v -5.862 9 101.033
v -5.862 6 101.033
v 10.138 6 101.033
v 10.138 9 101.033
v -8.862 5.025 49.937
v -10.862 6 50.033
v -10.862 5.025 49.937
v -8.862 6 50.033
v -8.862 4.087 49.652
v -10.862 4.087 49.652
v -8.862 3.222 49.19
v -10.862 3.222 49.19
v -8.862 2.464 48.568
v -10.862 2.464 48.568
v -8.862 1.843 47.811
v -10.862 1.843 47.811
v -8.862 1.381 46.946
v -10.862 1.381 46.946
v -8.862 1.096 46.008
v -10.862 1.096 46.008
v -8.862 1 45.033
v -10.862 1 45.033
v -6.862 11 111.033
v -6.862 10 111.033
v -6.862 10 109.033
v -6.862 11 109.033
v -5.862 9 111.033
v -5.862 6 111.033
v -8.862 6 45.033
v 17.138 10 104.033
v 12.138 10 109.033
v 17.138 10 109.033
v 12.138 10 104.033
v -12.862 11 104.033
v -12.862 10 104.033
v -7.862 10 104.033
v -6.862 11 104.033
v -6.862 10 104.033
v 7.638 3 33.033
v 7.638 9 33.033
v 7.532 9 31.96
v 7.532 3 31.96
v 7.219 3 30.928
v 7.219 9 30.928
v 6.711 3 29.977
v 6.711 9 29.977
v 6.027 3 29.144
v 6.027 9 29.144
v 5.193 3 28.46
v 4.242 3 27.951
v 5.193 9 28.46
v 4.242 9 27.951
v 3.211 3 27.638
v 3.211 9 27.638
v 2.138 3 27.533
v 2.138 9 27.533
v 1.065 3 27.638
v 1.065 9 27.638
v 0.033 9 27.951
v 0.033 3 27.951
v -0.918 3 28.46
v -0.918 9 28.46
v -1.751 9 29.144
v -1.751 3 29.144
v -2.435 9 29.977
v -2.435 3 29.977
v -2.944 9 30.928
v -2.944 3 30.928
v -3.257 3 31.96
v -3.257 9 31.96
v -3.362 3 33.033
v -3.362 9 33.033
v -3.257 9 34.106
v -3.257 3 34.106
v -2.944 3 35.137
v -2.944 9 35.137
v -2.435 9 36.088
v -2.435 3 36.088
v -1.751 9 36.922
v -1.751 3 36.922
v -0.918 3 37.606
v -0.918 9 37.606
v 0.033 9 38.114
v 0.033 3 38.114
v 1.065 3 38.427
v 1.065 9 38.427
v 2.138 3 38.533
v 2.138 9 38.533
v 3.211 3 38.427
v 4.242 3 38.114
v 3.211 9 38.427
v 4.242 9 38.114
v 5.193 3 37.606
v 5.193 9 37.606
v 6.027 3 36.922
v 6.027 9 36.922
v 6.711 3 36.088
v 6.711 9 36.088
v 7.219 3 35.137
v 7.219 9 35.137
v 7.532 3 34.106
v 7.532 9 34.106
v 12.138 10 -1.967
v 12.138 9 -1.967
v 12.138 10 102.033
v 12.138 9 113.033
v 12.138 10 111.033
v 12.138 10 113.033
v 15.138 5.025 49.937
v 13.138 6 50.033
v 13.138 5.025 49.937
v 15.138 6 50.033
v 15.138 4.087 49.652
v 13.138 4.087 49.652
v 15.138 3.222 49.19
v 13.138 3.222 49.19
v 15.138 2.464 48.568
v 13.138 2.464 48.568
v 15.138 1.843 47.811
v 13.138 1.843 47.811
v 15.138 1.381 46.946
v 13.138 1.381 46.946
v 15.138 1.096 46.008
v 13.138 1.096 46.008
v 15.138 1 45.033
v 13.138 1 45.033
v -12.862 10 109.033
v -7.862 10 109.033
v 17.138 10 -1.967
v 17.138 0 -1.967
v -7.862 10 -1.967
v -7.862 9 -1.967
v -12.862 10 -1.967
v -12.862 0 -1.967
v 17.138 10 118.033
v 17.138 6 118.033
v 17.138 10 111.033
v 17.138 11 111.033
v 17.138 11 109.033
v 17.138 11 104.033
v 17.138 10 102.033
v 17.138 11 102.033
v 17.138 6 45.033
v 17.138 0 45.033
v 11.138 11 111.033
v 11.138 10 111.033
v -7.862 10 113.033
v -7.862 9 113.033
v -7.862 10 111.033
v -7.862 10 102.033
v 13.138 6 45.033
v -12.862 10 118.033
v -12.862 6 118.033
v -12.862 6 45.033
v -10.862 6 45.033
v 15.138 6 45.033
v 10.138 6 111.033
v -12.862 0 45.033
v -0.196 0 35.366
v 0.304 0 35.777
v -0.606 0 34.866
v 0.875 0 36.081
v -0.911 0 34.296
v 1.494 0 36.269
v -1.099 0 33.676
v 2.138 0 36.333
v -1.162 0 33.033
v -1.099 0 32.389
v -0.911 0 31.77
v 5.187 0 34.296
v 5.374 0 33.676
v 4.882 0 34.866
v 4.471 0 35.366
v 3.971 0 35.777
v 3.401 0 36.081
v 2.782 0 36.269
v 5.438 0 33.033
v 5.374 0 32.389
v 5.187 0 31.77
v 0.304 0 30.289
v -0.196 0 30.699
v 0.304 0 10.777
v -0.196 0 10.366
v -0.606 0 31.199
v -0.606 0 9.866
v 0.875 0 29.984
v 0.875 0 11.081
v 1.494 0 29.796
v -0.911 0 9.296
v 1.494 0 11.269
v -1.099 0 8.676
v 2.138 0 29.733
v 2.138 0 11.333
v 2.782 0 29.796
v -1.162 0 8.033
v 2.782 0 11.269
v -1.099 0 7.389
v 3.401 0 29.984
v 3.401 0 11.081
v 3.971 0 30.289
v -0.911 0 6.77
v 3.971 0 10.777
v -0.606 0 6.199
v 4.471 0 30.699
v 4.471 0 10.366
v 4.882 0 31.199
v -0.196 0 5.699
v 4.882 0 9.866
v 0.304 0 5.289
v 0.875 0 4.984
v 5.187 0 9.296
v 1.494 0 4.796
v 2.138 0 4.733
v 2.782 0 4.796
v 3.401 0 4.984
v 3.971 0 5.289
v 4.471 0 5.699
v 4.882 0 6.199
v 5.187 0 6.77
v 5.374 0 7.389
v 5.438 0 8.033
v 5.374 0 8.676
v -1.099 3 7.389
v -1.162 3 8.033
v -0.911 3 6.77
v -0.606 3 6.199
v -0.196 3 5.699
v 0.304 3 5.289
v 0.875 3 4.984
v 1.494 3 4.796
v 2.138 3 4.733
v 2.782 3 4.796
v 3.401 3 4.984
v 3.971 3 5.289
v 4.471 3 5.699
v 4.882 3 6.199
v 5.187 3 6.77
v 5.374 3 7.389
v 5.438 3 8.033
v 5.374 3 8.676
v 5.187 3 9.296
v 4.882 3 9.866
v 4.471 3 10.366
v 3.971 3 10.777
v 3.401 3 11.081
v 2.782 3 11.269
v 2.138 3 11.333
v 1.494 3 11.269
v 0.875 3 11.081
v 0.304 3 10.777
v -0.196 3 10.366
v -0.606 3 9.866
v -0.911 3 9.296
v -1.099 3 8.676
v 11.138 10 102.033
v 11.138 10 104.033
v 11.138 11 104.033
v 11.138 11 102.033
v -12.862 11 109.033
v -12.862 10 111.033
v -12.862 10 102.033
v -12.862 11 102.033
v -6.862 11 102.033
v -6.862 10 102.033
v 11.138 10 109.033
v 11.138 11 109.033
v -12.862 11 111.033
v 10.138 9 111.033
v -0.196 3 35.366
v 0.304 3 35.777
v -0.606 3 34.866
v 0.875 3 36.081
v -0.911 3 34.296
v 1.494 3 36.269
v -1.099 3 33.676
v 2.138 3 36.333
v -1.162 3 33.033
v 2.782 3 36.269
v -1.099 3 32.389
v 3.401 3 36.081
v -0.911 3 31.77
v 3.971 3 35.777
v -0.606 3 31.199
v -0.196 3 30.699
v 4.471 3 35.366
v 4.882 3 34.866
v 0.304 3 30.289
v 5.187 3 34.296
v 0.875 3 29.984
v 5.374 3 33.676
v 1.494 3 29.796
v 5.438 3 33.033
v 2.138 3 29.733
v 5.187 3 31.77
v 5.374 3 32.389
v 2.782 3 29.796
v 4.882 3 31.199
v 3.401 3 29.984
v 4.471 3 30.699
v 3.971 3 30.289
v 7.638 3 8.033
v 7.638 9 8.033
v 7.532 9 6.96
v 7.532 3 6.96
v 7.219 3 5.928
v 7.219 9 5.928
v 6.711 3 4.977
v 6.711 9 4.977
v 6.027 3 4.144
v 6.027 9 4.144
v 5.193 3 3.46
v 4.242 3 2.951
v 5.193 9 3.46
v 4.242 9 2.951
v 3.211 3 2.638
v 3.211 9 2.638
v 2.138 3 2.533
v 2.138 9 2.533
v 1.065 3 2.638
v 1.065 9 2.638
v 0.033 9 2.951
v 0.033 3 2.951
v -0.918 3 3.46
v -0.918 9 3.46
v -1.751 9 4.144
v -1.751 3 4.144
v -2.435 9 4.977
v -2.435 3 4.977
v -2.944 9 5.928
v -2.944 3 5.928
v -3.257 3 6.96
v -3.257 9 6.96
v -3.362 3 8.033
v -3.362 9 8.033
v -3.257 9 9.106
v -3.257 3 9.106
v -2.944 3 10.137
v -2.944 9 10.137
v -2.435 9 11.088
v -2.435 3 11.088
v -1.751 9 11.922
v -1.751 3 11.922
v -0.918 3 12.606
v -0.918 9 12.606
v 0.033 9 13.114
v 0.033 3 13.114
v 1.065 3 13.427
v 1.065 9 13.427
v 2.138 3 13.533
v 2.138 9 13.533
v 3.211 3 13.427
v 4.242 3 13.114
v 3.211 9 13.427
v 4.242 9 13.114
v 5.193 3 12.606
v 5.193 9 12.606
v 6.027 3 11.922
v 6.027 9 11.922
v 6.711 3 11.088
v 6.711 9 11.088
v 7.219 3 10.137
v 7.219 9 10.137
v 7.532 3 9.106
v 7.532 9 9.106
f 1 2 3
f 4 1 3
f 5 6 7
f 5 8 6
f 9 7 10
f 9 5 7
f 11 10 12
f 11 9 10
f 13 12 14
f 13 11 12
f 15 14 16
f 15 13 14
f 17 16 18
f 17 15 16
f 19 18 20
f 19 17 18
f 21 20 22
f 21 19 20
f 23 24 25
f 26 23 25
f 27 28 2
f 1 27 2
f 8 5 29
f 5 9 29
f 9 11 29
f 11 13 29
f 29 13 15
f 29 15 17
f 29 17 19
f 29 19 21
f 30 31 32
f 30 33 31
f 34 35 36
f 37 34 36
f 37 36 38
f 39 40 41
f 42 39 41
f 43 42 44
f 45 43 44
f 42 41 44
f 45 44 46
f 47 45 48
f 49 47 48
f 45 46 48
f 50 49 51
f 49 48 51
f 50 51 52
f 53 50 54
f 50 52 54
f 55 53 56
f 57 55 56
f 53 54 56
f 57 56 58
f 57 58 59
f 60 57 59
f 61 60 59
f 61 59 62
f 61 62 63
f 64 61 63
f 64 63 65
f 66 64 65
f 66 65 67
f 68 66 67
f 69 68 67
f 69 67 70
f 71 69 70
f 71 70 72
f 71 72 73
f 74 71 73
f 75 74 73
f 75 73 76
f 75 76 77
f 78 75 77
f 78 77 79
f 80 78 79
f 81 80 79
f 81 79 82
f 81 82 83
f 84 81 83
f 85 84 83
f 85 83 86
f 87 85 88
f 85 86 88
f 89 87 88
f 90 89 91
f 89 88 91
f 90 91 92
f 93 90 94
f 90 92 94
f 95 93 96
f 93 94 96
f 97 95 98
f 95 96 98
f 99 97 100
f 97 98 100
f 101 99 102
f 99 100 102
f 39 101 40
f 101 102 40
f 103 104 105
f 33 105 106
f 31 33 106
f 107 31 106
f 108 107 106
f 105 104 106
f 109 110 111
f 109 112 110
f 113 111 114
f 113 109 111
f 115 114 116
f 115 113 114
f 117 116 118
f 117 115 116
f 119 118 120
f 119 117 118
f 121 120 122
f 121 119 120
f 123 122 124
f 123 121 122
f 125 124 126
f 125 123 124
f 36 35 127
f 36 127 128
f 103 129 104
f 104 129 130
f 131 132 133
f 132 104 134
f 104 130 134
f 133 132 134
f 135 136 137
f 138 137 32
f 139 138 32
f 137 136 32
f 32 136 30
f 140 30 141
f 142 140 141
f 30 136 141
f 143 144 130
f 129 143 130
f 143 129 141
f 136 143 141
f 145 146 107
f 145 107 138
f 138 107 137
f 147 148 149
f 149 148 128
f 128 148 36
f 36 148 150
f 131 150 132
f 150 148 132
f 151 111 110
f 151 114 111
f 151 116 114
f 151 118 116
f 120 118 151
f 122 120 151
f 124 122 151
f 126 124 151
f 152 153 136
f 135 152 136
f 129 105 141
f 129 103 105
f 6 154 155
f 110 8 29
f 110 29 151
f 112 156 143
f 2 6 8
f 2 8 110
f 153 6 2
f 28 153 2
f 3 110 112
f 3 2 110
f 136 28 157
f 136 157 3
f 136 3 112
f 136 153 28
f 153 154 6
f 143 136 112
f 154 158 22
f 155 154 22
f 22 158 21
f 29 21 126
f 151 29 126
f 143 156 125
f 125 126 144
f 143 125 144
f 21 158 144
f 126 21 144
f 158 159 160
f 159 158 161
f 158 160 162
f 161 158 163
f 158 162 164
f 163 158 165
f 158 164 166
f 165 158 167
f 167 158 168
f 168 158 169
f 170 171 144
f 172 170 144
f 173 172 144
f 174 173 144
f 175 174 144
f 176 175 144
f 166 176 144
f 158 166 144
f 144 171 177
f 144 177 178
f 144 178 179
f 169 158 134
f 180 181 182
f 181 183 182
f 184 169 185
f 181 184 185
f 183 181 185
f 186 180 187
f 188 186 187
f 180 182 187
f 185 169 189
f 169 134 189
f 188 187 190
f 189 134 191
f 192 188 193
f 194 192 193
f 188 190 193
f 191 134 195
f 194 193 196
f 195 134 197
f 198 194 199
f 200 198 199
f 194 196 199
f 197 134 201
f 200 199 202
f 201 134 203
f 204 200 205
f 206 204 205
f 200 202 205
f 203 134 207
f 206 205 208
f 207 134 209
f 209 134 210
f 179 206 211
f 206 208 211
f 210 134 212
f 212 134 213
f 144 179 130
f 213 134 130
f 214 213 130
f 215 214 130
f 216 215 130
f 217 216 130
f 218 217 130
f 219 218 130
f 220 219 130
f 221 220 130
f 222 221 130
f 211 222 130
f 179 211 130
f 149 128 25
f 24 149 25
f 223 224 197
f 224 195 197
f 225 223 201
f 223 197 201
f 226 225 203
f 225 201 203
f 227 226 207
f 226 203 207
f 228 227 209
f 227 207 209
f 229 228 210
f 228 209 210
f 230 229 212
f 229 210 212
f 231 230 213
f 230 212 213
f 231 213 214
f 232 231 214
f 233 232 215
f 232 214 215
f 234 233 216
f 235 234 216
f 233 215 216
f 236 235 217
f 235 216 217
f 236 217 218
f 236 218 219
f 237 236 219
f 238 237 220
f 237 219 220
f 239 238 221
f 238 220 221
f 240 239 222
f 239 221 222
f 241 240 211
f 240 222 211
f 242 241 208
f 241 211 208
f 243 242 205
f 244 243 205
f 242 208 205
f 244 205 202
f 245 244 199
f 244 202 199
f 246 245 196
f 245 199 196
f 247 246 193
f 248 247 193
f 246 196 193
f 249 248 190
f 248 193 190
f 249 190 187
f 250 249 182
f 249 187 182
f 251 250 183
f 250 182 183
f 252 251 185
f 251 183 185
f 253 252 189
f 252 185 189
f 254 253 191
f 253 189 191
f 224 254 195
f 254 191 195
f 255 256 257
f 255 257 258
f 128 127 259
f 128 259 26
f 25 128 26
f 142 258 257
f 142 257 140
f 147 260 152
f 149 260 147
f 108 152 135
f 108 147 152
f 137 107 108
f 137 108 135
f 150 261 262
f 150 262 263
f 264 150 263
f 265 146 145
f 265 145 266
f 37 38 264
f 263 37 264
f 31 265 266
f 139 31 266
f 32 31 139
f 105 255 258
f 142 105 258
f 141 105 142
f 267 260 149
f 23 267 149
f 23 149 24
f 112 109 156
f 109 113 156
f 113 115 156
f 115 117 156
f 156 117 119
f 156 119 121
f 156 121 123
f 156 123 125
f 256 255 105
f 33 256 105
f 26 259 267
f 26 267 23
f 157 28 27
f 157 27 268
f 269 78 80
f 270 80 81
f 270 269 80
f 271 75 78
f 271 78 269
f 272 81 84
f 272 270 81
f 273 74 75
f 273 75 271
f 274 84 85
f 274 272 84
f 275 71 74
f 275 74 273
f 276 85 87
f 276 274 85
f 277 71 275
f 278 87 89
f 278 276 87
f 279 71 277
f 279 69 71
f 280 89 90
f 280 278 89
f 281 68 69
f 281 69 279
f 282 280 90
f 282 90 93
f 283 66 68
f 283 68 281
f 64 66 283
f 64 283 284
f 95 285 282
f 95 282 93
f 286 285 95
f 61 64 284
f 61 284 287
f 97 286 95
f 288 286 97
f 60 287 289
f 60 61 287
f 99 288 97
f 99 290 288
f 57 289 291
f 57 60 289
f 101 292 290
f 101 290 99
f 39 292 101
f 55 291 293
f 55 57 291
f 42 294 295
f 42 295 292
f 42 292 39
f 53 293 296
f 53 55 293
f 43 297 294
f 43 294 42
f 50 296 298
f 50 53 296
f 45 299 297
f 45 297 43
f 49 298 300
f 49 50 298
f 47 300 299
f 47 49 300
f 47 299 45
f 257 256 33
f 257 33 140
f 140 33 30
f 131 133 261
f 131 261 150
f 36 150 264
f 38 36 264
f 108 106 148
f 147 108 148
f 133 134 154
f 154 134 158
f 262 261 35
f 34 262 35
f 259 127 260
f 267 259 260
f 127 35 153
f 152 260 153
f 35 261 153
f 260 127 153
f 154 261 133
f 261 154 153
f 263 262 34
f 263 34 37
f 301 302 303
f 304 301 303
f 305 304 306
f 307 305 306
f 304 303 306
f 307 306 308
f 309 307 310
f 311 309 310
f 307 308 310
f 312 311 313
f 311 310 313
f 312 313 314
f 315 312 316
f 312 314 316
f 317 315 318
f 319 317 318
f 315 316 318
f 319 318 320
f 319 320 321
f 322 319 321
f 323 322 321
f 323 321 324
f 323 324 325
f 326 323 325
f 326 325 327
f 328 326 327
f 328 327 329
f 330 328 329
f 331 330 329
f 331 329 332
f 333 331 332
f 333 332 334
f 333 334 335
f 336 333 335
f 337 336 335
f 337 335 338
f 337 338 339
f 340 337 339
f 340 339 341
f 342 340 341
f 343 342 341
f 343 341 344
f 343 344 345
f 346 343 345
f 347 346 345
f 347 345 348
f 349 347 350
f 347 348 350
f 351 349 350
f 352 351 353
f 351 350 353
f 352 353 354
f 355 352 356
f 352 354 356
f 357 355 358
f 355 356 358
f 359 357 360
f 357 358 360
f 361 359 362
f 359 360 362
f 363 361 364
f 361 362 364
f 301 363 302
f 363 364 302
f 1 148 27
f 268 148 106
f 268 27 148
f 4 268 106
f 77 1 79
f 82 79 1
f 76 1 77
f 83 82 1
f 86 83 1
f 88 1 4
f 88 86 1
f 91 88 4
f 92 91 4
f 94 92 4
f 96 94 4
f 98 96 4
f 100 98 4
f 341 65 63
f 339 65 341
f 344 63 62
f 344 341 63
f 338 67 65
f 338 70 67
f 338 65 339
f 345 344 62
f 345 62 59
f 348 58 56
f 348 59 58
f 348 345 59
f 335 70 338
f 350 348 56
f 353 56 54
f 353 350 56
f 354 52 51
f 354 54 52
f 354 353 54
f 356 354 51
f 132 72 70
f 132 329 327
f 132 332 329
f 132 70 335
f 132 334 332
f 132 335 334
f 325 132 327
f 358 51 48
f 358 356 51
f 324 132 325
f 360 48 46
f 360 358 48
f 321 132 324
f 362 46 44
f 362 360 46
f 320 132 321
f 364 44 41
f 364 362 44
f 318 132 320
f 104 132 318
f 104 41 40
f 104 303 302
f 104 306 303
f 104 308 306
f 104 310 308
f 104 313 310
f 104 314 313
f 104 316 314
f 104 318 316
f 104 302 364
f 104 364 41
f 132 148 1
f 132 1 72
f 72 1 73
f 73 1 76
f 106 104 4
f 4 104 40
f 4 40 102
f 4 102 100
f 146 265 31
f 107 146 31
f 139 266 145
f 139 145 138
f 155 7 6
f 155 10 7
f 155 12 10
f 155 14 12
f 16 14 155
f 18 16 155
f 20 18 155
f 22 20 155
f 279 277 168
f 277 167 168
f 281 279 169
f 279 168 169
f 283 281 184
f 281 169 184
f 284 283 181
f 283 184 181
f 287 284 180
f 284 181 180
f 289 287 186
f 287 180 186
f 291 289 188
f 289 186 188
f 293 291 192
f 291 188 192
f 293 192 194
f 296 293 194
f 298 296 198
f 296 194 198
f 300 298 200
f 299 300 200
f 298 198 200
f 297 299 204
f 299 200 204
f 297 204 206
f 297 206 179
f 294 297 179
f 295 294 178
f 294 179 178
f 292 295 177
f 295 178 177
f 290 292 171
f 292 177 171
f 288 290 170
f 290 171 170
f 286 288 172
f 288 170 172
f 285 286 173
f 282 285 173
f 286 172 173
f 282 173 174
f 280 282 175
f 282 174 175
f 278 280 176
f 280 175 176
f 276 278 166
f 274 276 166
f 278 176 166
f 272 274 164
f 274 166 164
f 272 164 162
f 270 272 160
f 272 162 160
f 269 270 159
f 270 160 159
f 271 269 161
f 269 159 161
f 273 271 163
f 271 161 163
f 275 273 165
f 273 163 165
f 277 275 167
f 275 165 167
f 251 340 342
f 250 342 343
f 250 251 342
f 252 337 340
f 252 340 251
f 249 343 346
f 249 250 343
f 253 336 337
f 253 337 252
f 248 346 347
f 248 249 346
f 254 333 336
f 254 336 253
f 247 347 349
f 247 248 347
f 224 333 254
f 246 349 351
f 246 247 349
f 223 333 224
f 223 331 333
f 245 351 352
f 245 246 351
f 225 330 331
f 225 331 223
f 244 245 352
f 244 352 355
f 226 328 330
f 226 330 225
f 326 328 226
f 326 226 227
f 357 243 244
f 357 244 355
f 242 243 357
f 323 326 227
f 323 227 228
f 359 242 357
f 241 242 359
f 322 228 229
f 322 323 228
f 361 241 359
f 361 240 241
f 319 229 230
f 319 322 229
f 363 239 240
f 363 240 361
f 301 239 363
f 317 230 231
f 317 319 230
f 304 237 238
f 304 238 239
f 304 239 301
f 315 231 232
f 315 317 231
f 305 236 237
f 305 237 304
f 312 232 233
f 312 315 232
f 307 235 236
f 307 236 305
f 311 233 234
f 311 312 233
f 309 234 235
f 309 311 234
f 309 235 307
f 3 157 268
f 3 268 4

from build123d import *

# Parameters (mm, degrees)
SKETCH1_W                                     = 30
SKETCH1_H                                     = 120
BOSS_EXTRUDE1_DEPTH                           = 9
BOSS_EXTRUDE2_DEPTH                           = 1
CBORE_FOR_M6_HEX_SOCKET_HEAD_CAP1_D           = 6.6
CBORE_FOR_M6_HEX_SOCKET_HEAD_CAP1_CBORE_D     = 11
CBORE_FOR_M6_HEX_SOCKET_HEAD_CAP1_CBORE_DEPTH = 6
SKETCH17_W                                    = 6
SKETCH17_H                                    = 2
BOSS_EXTRUDE3_DEPTH                           = 1
CUT_EXTRUDE11_DEPTH                           = 120.609404064
CUT_EXTRUDE11_DEPTH_BACK                      = 120.609404064
SKETCH18_W                                    = 16
SKETCH18_H                                    = 10
SKETCH19_W                                    = 30
SKETCH19_H                                    = 73
CUT_EXTRUDE12_DEPTH                           = 6
SKETCH20_W                                    = 2
SKETCH20_H                                    = 5
REVOLVE2_ANGLE                                = 90


with BuildPart() as part:
    # Sketch1 → Boss-Extrude1 (new body)
    with BuildSketch(Plane(origin=(0, 0, 0), x_dir=(1, 0, 0), z_dir=(0, 1, 0))):
        with Locations((2.137715261, -58.032657583)):
            Rectangle(SKETCH1_W, SKETCH1_H)
    extrude(amount=BOSS_EXTRUDE1_DEPTH)

    # Sketch2 → Boss-Extrude2 (add)
    with BuildSketch(Plane(origin=(0, 9, 0), x_dir=(1, 0, 0), z_dir=(0, 1, 0))):
        Polygon((-12.862284739, -118.032657583), (17.137715261, -118.032657583), (17.137715261, -68.032657583), (17.137715261, 1.967342417), (12.137715261, 1.967342417), (12.137715261, -113.032657583), (-7.862284739, -113.032657583), (-7.862284739, 1.967342417), (-12.862284739, 1.967342417), (-12.862284739, -73.032657583), align=None)
    extrude(amount=BOSS_EXTRUDE2_DEPTH)

    # CBORE for M6 Hex Socket Head Cap1 (through all)
    with Locations(Plane(origin=(0, 9, 0), x_dir=(1, 0, 0), z_dir=(0, 1, 0))):
        with Locations((2.137715261, -8.032657583), (2.137715261, -33.032657583)):
            CounterBoreHole(CBORE_FOR_M6_HEX_SOCKET_HEAD_CAP1_D / 2, CBORE_FOR_M6_HEX_SOCKET_HEAD_CAP1_CBORE_D / 2, CBORE_FOR_M6_HEX_SOCKET_HEAD_CAP1_CBORE_DEPTH)

    # Sketch17 → Boss-Extrude3 (add)
    with BuildSketch(Plane(origin=(0, 10, 0), x_dir=(1, 0, 0), z_dir=(0, 1, 0))):
        with Locations((14.137715261, -110.032657583)):
            Rectangle(SKETCH17_W, SKETCH17_H)
        with Locations((-9.862284739, -110.032657583)):
            Rectangle(SKETCH17_W, SKETCH17_H)
        with Locations((14.137715261, -103.032657583)):
            Rectangle(SKETCH17_W, SKETCH17_H)
        with Locations((-9.862284739, -103.032657583)):
            Rectangle(SKETCH17_W, SKETCH17_H)
    extrude(amount=BOSS_EXTRUDE3_DEPTH)

    # Sketch18 → Cut-Extrude11 (cut, two sides: drawn at the far end of the back side and taken through both)
    with BuildSketch(Plane(origin=(0, 9, 0), x_dir=(1, 0, 0), z_dir=(0, 1, 0)).offset(-CUT_EXTRUDE11_DEPTH_BACK)):
        with Locations((2.137715261, -106.032657583)):
            Rectangle(SKETCH18_W, SKETCH18_H)
    extrude(amount=CUT_EXTRUDE11_DEPTH + CUT_EXTRUDE11_DEPTH_BACK, mode=Mode.SUBTRACT)

    # Sketch19 → Cut-Extrude12 (cut)
    with BuildSketch(Plane.XZ):
        with Locations((2.137715261, 81.532657583)):
            Rectangle(SKETCH19_W, SKETCH19_H)
    extrude(amount=-CUT_EXTRUDE12_DEPTH, mode=Mode.SUBTRACT)

    # Sketch20 → Revolve2 (revolve)
    with BuildSketch(Plane.XZ.offset(-6)):
        with Locations((-9.862284739, 47.532657583)):
            Rectangle(SKETCH20_W, SKETCH20_H)
        with Locations((14.137715261, 47.532657583)):
            Rectangle(SKETCH20_W, SKETCH20_H)
    revolve(axis=Axis((17.137715261, 6, 45.032657583), (1, 0, 0)), revolution_arc=REVOLVE2_ANGLE)


solid = part.part
